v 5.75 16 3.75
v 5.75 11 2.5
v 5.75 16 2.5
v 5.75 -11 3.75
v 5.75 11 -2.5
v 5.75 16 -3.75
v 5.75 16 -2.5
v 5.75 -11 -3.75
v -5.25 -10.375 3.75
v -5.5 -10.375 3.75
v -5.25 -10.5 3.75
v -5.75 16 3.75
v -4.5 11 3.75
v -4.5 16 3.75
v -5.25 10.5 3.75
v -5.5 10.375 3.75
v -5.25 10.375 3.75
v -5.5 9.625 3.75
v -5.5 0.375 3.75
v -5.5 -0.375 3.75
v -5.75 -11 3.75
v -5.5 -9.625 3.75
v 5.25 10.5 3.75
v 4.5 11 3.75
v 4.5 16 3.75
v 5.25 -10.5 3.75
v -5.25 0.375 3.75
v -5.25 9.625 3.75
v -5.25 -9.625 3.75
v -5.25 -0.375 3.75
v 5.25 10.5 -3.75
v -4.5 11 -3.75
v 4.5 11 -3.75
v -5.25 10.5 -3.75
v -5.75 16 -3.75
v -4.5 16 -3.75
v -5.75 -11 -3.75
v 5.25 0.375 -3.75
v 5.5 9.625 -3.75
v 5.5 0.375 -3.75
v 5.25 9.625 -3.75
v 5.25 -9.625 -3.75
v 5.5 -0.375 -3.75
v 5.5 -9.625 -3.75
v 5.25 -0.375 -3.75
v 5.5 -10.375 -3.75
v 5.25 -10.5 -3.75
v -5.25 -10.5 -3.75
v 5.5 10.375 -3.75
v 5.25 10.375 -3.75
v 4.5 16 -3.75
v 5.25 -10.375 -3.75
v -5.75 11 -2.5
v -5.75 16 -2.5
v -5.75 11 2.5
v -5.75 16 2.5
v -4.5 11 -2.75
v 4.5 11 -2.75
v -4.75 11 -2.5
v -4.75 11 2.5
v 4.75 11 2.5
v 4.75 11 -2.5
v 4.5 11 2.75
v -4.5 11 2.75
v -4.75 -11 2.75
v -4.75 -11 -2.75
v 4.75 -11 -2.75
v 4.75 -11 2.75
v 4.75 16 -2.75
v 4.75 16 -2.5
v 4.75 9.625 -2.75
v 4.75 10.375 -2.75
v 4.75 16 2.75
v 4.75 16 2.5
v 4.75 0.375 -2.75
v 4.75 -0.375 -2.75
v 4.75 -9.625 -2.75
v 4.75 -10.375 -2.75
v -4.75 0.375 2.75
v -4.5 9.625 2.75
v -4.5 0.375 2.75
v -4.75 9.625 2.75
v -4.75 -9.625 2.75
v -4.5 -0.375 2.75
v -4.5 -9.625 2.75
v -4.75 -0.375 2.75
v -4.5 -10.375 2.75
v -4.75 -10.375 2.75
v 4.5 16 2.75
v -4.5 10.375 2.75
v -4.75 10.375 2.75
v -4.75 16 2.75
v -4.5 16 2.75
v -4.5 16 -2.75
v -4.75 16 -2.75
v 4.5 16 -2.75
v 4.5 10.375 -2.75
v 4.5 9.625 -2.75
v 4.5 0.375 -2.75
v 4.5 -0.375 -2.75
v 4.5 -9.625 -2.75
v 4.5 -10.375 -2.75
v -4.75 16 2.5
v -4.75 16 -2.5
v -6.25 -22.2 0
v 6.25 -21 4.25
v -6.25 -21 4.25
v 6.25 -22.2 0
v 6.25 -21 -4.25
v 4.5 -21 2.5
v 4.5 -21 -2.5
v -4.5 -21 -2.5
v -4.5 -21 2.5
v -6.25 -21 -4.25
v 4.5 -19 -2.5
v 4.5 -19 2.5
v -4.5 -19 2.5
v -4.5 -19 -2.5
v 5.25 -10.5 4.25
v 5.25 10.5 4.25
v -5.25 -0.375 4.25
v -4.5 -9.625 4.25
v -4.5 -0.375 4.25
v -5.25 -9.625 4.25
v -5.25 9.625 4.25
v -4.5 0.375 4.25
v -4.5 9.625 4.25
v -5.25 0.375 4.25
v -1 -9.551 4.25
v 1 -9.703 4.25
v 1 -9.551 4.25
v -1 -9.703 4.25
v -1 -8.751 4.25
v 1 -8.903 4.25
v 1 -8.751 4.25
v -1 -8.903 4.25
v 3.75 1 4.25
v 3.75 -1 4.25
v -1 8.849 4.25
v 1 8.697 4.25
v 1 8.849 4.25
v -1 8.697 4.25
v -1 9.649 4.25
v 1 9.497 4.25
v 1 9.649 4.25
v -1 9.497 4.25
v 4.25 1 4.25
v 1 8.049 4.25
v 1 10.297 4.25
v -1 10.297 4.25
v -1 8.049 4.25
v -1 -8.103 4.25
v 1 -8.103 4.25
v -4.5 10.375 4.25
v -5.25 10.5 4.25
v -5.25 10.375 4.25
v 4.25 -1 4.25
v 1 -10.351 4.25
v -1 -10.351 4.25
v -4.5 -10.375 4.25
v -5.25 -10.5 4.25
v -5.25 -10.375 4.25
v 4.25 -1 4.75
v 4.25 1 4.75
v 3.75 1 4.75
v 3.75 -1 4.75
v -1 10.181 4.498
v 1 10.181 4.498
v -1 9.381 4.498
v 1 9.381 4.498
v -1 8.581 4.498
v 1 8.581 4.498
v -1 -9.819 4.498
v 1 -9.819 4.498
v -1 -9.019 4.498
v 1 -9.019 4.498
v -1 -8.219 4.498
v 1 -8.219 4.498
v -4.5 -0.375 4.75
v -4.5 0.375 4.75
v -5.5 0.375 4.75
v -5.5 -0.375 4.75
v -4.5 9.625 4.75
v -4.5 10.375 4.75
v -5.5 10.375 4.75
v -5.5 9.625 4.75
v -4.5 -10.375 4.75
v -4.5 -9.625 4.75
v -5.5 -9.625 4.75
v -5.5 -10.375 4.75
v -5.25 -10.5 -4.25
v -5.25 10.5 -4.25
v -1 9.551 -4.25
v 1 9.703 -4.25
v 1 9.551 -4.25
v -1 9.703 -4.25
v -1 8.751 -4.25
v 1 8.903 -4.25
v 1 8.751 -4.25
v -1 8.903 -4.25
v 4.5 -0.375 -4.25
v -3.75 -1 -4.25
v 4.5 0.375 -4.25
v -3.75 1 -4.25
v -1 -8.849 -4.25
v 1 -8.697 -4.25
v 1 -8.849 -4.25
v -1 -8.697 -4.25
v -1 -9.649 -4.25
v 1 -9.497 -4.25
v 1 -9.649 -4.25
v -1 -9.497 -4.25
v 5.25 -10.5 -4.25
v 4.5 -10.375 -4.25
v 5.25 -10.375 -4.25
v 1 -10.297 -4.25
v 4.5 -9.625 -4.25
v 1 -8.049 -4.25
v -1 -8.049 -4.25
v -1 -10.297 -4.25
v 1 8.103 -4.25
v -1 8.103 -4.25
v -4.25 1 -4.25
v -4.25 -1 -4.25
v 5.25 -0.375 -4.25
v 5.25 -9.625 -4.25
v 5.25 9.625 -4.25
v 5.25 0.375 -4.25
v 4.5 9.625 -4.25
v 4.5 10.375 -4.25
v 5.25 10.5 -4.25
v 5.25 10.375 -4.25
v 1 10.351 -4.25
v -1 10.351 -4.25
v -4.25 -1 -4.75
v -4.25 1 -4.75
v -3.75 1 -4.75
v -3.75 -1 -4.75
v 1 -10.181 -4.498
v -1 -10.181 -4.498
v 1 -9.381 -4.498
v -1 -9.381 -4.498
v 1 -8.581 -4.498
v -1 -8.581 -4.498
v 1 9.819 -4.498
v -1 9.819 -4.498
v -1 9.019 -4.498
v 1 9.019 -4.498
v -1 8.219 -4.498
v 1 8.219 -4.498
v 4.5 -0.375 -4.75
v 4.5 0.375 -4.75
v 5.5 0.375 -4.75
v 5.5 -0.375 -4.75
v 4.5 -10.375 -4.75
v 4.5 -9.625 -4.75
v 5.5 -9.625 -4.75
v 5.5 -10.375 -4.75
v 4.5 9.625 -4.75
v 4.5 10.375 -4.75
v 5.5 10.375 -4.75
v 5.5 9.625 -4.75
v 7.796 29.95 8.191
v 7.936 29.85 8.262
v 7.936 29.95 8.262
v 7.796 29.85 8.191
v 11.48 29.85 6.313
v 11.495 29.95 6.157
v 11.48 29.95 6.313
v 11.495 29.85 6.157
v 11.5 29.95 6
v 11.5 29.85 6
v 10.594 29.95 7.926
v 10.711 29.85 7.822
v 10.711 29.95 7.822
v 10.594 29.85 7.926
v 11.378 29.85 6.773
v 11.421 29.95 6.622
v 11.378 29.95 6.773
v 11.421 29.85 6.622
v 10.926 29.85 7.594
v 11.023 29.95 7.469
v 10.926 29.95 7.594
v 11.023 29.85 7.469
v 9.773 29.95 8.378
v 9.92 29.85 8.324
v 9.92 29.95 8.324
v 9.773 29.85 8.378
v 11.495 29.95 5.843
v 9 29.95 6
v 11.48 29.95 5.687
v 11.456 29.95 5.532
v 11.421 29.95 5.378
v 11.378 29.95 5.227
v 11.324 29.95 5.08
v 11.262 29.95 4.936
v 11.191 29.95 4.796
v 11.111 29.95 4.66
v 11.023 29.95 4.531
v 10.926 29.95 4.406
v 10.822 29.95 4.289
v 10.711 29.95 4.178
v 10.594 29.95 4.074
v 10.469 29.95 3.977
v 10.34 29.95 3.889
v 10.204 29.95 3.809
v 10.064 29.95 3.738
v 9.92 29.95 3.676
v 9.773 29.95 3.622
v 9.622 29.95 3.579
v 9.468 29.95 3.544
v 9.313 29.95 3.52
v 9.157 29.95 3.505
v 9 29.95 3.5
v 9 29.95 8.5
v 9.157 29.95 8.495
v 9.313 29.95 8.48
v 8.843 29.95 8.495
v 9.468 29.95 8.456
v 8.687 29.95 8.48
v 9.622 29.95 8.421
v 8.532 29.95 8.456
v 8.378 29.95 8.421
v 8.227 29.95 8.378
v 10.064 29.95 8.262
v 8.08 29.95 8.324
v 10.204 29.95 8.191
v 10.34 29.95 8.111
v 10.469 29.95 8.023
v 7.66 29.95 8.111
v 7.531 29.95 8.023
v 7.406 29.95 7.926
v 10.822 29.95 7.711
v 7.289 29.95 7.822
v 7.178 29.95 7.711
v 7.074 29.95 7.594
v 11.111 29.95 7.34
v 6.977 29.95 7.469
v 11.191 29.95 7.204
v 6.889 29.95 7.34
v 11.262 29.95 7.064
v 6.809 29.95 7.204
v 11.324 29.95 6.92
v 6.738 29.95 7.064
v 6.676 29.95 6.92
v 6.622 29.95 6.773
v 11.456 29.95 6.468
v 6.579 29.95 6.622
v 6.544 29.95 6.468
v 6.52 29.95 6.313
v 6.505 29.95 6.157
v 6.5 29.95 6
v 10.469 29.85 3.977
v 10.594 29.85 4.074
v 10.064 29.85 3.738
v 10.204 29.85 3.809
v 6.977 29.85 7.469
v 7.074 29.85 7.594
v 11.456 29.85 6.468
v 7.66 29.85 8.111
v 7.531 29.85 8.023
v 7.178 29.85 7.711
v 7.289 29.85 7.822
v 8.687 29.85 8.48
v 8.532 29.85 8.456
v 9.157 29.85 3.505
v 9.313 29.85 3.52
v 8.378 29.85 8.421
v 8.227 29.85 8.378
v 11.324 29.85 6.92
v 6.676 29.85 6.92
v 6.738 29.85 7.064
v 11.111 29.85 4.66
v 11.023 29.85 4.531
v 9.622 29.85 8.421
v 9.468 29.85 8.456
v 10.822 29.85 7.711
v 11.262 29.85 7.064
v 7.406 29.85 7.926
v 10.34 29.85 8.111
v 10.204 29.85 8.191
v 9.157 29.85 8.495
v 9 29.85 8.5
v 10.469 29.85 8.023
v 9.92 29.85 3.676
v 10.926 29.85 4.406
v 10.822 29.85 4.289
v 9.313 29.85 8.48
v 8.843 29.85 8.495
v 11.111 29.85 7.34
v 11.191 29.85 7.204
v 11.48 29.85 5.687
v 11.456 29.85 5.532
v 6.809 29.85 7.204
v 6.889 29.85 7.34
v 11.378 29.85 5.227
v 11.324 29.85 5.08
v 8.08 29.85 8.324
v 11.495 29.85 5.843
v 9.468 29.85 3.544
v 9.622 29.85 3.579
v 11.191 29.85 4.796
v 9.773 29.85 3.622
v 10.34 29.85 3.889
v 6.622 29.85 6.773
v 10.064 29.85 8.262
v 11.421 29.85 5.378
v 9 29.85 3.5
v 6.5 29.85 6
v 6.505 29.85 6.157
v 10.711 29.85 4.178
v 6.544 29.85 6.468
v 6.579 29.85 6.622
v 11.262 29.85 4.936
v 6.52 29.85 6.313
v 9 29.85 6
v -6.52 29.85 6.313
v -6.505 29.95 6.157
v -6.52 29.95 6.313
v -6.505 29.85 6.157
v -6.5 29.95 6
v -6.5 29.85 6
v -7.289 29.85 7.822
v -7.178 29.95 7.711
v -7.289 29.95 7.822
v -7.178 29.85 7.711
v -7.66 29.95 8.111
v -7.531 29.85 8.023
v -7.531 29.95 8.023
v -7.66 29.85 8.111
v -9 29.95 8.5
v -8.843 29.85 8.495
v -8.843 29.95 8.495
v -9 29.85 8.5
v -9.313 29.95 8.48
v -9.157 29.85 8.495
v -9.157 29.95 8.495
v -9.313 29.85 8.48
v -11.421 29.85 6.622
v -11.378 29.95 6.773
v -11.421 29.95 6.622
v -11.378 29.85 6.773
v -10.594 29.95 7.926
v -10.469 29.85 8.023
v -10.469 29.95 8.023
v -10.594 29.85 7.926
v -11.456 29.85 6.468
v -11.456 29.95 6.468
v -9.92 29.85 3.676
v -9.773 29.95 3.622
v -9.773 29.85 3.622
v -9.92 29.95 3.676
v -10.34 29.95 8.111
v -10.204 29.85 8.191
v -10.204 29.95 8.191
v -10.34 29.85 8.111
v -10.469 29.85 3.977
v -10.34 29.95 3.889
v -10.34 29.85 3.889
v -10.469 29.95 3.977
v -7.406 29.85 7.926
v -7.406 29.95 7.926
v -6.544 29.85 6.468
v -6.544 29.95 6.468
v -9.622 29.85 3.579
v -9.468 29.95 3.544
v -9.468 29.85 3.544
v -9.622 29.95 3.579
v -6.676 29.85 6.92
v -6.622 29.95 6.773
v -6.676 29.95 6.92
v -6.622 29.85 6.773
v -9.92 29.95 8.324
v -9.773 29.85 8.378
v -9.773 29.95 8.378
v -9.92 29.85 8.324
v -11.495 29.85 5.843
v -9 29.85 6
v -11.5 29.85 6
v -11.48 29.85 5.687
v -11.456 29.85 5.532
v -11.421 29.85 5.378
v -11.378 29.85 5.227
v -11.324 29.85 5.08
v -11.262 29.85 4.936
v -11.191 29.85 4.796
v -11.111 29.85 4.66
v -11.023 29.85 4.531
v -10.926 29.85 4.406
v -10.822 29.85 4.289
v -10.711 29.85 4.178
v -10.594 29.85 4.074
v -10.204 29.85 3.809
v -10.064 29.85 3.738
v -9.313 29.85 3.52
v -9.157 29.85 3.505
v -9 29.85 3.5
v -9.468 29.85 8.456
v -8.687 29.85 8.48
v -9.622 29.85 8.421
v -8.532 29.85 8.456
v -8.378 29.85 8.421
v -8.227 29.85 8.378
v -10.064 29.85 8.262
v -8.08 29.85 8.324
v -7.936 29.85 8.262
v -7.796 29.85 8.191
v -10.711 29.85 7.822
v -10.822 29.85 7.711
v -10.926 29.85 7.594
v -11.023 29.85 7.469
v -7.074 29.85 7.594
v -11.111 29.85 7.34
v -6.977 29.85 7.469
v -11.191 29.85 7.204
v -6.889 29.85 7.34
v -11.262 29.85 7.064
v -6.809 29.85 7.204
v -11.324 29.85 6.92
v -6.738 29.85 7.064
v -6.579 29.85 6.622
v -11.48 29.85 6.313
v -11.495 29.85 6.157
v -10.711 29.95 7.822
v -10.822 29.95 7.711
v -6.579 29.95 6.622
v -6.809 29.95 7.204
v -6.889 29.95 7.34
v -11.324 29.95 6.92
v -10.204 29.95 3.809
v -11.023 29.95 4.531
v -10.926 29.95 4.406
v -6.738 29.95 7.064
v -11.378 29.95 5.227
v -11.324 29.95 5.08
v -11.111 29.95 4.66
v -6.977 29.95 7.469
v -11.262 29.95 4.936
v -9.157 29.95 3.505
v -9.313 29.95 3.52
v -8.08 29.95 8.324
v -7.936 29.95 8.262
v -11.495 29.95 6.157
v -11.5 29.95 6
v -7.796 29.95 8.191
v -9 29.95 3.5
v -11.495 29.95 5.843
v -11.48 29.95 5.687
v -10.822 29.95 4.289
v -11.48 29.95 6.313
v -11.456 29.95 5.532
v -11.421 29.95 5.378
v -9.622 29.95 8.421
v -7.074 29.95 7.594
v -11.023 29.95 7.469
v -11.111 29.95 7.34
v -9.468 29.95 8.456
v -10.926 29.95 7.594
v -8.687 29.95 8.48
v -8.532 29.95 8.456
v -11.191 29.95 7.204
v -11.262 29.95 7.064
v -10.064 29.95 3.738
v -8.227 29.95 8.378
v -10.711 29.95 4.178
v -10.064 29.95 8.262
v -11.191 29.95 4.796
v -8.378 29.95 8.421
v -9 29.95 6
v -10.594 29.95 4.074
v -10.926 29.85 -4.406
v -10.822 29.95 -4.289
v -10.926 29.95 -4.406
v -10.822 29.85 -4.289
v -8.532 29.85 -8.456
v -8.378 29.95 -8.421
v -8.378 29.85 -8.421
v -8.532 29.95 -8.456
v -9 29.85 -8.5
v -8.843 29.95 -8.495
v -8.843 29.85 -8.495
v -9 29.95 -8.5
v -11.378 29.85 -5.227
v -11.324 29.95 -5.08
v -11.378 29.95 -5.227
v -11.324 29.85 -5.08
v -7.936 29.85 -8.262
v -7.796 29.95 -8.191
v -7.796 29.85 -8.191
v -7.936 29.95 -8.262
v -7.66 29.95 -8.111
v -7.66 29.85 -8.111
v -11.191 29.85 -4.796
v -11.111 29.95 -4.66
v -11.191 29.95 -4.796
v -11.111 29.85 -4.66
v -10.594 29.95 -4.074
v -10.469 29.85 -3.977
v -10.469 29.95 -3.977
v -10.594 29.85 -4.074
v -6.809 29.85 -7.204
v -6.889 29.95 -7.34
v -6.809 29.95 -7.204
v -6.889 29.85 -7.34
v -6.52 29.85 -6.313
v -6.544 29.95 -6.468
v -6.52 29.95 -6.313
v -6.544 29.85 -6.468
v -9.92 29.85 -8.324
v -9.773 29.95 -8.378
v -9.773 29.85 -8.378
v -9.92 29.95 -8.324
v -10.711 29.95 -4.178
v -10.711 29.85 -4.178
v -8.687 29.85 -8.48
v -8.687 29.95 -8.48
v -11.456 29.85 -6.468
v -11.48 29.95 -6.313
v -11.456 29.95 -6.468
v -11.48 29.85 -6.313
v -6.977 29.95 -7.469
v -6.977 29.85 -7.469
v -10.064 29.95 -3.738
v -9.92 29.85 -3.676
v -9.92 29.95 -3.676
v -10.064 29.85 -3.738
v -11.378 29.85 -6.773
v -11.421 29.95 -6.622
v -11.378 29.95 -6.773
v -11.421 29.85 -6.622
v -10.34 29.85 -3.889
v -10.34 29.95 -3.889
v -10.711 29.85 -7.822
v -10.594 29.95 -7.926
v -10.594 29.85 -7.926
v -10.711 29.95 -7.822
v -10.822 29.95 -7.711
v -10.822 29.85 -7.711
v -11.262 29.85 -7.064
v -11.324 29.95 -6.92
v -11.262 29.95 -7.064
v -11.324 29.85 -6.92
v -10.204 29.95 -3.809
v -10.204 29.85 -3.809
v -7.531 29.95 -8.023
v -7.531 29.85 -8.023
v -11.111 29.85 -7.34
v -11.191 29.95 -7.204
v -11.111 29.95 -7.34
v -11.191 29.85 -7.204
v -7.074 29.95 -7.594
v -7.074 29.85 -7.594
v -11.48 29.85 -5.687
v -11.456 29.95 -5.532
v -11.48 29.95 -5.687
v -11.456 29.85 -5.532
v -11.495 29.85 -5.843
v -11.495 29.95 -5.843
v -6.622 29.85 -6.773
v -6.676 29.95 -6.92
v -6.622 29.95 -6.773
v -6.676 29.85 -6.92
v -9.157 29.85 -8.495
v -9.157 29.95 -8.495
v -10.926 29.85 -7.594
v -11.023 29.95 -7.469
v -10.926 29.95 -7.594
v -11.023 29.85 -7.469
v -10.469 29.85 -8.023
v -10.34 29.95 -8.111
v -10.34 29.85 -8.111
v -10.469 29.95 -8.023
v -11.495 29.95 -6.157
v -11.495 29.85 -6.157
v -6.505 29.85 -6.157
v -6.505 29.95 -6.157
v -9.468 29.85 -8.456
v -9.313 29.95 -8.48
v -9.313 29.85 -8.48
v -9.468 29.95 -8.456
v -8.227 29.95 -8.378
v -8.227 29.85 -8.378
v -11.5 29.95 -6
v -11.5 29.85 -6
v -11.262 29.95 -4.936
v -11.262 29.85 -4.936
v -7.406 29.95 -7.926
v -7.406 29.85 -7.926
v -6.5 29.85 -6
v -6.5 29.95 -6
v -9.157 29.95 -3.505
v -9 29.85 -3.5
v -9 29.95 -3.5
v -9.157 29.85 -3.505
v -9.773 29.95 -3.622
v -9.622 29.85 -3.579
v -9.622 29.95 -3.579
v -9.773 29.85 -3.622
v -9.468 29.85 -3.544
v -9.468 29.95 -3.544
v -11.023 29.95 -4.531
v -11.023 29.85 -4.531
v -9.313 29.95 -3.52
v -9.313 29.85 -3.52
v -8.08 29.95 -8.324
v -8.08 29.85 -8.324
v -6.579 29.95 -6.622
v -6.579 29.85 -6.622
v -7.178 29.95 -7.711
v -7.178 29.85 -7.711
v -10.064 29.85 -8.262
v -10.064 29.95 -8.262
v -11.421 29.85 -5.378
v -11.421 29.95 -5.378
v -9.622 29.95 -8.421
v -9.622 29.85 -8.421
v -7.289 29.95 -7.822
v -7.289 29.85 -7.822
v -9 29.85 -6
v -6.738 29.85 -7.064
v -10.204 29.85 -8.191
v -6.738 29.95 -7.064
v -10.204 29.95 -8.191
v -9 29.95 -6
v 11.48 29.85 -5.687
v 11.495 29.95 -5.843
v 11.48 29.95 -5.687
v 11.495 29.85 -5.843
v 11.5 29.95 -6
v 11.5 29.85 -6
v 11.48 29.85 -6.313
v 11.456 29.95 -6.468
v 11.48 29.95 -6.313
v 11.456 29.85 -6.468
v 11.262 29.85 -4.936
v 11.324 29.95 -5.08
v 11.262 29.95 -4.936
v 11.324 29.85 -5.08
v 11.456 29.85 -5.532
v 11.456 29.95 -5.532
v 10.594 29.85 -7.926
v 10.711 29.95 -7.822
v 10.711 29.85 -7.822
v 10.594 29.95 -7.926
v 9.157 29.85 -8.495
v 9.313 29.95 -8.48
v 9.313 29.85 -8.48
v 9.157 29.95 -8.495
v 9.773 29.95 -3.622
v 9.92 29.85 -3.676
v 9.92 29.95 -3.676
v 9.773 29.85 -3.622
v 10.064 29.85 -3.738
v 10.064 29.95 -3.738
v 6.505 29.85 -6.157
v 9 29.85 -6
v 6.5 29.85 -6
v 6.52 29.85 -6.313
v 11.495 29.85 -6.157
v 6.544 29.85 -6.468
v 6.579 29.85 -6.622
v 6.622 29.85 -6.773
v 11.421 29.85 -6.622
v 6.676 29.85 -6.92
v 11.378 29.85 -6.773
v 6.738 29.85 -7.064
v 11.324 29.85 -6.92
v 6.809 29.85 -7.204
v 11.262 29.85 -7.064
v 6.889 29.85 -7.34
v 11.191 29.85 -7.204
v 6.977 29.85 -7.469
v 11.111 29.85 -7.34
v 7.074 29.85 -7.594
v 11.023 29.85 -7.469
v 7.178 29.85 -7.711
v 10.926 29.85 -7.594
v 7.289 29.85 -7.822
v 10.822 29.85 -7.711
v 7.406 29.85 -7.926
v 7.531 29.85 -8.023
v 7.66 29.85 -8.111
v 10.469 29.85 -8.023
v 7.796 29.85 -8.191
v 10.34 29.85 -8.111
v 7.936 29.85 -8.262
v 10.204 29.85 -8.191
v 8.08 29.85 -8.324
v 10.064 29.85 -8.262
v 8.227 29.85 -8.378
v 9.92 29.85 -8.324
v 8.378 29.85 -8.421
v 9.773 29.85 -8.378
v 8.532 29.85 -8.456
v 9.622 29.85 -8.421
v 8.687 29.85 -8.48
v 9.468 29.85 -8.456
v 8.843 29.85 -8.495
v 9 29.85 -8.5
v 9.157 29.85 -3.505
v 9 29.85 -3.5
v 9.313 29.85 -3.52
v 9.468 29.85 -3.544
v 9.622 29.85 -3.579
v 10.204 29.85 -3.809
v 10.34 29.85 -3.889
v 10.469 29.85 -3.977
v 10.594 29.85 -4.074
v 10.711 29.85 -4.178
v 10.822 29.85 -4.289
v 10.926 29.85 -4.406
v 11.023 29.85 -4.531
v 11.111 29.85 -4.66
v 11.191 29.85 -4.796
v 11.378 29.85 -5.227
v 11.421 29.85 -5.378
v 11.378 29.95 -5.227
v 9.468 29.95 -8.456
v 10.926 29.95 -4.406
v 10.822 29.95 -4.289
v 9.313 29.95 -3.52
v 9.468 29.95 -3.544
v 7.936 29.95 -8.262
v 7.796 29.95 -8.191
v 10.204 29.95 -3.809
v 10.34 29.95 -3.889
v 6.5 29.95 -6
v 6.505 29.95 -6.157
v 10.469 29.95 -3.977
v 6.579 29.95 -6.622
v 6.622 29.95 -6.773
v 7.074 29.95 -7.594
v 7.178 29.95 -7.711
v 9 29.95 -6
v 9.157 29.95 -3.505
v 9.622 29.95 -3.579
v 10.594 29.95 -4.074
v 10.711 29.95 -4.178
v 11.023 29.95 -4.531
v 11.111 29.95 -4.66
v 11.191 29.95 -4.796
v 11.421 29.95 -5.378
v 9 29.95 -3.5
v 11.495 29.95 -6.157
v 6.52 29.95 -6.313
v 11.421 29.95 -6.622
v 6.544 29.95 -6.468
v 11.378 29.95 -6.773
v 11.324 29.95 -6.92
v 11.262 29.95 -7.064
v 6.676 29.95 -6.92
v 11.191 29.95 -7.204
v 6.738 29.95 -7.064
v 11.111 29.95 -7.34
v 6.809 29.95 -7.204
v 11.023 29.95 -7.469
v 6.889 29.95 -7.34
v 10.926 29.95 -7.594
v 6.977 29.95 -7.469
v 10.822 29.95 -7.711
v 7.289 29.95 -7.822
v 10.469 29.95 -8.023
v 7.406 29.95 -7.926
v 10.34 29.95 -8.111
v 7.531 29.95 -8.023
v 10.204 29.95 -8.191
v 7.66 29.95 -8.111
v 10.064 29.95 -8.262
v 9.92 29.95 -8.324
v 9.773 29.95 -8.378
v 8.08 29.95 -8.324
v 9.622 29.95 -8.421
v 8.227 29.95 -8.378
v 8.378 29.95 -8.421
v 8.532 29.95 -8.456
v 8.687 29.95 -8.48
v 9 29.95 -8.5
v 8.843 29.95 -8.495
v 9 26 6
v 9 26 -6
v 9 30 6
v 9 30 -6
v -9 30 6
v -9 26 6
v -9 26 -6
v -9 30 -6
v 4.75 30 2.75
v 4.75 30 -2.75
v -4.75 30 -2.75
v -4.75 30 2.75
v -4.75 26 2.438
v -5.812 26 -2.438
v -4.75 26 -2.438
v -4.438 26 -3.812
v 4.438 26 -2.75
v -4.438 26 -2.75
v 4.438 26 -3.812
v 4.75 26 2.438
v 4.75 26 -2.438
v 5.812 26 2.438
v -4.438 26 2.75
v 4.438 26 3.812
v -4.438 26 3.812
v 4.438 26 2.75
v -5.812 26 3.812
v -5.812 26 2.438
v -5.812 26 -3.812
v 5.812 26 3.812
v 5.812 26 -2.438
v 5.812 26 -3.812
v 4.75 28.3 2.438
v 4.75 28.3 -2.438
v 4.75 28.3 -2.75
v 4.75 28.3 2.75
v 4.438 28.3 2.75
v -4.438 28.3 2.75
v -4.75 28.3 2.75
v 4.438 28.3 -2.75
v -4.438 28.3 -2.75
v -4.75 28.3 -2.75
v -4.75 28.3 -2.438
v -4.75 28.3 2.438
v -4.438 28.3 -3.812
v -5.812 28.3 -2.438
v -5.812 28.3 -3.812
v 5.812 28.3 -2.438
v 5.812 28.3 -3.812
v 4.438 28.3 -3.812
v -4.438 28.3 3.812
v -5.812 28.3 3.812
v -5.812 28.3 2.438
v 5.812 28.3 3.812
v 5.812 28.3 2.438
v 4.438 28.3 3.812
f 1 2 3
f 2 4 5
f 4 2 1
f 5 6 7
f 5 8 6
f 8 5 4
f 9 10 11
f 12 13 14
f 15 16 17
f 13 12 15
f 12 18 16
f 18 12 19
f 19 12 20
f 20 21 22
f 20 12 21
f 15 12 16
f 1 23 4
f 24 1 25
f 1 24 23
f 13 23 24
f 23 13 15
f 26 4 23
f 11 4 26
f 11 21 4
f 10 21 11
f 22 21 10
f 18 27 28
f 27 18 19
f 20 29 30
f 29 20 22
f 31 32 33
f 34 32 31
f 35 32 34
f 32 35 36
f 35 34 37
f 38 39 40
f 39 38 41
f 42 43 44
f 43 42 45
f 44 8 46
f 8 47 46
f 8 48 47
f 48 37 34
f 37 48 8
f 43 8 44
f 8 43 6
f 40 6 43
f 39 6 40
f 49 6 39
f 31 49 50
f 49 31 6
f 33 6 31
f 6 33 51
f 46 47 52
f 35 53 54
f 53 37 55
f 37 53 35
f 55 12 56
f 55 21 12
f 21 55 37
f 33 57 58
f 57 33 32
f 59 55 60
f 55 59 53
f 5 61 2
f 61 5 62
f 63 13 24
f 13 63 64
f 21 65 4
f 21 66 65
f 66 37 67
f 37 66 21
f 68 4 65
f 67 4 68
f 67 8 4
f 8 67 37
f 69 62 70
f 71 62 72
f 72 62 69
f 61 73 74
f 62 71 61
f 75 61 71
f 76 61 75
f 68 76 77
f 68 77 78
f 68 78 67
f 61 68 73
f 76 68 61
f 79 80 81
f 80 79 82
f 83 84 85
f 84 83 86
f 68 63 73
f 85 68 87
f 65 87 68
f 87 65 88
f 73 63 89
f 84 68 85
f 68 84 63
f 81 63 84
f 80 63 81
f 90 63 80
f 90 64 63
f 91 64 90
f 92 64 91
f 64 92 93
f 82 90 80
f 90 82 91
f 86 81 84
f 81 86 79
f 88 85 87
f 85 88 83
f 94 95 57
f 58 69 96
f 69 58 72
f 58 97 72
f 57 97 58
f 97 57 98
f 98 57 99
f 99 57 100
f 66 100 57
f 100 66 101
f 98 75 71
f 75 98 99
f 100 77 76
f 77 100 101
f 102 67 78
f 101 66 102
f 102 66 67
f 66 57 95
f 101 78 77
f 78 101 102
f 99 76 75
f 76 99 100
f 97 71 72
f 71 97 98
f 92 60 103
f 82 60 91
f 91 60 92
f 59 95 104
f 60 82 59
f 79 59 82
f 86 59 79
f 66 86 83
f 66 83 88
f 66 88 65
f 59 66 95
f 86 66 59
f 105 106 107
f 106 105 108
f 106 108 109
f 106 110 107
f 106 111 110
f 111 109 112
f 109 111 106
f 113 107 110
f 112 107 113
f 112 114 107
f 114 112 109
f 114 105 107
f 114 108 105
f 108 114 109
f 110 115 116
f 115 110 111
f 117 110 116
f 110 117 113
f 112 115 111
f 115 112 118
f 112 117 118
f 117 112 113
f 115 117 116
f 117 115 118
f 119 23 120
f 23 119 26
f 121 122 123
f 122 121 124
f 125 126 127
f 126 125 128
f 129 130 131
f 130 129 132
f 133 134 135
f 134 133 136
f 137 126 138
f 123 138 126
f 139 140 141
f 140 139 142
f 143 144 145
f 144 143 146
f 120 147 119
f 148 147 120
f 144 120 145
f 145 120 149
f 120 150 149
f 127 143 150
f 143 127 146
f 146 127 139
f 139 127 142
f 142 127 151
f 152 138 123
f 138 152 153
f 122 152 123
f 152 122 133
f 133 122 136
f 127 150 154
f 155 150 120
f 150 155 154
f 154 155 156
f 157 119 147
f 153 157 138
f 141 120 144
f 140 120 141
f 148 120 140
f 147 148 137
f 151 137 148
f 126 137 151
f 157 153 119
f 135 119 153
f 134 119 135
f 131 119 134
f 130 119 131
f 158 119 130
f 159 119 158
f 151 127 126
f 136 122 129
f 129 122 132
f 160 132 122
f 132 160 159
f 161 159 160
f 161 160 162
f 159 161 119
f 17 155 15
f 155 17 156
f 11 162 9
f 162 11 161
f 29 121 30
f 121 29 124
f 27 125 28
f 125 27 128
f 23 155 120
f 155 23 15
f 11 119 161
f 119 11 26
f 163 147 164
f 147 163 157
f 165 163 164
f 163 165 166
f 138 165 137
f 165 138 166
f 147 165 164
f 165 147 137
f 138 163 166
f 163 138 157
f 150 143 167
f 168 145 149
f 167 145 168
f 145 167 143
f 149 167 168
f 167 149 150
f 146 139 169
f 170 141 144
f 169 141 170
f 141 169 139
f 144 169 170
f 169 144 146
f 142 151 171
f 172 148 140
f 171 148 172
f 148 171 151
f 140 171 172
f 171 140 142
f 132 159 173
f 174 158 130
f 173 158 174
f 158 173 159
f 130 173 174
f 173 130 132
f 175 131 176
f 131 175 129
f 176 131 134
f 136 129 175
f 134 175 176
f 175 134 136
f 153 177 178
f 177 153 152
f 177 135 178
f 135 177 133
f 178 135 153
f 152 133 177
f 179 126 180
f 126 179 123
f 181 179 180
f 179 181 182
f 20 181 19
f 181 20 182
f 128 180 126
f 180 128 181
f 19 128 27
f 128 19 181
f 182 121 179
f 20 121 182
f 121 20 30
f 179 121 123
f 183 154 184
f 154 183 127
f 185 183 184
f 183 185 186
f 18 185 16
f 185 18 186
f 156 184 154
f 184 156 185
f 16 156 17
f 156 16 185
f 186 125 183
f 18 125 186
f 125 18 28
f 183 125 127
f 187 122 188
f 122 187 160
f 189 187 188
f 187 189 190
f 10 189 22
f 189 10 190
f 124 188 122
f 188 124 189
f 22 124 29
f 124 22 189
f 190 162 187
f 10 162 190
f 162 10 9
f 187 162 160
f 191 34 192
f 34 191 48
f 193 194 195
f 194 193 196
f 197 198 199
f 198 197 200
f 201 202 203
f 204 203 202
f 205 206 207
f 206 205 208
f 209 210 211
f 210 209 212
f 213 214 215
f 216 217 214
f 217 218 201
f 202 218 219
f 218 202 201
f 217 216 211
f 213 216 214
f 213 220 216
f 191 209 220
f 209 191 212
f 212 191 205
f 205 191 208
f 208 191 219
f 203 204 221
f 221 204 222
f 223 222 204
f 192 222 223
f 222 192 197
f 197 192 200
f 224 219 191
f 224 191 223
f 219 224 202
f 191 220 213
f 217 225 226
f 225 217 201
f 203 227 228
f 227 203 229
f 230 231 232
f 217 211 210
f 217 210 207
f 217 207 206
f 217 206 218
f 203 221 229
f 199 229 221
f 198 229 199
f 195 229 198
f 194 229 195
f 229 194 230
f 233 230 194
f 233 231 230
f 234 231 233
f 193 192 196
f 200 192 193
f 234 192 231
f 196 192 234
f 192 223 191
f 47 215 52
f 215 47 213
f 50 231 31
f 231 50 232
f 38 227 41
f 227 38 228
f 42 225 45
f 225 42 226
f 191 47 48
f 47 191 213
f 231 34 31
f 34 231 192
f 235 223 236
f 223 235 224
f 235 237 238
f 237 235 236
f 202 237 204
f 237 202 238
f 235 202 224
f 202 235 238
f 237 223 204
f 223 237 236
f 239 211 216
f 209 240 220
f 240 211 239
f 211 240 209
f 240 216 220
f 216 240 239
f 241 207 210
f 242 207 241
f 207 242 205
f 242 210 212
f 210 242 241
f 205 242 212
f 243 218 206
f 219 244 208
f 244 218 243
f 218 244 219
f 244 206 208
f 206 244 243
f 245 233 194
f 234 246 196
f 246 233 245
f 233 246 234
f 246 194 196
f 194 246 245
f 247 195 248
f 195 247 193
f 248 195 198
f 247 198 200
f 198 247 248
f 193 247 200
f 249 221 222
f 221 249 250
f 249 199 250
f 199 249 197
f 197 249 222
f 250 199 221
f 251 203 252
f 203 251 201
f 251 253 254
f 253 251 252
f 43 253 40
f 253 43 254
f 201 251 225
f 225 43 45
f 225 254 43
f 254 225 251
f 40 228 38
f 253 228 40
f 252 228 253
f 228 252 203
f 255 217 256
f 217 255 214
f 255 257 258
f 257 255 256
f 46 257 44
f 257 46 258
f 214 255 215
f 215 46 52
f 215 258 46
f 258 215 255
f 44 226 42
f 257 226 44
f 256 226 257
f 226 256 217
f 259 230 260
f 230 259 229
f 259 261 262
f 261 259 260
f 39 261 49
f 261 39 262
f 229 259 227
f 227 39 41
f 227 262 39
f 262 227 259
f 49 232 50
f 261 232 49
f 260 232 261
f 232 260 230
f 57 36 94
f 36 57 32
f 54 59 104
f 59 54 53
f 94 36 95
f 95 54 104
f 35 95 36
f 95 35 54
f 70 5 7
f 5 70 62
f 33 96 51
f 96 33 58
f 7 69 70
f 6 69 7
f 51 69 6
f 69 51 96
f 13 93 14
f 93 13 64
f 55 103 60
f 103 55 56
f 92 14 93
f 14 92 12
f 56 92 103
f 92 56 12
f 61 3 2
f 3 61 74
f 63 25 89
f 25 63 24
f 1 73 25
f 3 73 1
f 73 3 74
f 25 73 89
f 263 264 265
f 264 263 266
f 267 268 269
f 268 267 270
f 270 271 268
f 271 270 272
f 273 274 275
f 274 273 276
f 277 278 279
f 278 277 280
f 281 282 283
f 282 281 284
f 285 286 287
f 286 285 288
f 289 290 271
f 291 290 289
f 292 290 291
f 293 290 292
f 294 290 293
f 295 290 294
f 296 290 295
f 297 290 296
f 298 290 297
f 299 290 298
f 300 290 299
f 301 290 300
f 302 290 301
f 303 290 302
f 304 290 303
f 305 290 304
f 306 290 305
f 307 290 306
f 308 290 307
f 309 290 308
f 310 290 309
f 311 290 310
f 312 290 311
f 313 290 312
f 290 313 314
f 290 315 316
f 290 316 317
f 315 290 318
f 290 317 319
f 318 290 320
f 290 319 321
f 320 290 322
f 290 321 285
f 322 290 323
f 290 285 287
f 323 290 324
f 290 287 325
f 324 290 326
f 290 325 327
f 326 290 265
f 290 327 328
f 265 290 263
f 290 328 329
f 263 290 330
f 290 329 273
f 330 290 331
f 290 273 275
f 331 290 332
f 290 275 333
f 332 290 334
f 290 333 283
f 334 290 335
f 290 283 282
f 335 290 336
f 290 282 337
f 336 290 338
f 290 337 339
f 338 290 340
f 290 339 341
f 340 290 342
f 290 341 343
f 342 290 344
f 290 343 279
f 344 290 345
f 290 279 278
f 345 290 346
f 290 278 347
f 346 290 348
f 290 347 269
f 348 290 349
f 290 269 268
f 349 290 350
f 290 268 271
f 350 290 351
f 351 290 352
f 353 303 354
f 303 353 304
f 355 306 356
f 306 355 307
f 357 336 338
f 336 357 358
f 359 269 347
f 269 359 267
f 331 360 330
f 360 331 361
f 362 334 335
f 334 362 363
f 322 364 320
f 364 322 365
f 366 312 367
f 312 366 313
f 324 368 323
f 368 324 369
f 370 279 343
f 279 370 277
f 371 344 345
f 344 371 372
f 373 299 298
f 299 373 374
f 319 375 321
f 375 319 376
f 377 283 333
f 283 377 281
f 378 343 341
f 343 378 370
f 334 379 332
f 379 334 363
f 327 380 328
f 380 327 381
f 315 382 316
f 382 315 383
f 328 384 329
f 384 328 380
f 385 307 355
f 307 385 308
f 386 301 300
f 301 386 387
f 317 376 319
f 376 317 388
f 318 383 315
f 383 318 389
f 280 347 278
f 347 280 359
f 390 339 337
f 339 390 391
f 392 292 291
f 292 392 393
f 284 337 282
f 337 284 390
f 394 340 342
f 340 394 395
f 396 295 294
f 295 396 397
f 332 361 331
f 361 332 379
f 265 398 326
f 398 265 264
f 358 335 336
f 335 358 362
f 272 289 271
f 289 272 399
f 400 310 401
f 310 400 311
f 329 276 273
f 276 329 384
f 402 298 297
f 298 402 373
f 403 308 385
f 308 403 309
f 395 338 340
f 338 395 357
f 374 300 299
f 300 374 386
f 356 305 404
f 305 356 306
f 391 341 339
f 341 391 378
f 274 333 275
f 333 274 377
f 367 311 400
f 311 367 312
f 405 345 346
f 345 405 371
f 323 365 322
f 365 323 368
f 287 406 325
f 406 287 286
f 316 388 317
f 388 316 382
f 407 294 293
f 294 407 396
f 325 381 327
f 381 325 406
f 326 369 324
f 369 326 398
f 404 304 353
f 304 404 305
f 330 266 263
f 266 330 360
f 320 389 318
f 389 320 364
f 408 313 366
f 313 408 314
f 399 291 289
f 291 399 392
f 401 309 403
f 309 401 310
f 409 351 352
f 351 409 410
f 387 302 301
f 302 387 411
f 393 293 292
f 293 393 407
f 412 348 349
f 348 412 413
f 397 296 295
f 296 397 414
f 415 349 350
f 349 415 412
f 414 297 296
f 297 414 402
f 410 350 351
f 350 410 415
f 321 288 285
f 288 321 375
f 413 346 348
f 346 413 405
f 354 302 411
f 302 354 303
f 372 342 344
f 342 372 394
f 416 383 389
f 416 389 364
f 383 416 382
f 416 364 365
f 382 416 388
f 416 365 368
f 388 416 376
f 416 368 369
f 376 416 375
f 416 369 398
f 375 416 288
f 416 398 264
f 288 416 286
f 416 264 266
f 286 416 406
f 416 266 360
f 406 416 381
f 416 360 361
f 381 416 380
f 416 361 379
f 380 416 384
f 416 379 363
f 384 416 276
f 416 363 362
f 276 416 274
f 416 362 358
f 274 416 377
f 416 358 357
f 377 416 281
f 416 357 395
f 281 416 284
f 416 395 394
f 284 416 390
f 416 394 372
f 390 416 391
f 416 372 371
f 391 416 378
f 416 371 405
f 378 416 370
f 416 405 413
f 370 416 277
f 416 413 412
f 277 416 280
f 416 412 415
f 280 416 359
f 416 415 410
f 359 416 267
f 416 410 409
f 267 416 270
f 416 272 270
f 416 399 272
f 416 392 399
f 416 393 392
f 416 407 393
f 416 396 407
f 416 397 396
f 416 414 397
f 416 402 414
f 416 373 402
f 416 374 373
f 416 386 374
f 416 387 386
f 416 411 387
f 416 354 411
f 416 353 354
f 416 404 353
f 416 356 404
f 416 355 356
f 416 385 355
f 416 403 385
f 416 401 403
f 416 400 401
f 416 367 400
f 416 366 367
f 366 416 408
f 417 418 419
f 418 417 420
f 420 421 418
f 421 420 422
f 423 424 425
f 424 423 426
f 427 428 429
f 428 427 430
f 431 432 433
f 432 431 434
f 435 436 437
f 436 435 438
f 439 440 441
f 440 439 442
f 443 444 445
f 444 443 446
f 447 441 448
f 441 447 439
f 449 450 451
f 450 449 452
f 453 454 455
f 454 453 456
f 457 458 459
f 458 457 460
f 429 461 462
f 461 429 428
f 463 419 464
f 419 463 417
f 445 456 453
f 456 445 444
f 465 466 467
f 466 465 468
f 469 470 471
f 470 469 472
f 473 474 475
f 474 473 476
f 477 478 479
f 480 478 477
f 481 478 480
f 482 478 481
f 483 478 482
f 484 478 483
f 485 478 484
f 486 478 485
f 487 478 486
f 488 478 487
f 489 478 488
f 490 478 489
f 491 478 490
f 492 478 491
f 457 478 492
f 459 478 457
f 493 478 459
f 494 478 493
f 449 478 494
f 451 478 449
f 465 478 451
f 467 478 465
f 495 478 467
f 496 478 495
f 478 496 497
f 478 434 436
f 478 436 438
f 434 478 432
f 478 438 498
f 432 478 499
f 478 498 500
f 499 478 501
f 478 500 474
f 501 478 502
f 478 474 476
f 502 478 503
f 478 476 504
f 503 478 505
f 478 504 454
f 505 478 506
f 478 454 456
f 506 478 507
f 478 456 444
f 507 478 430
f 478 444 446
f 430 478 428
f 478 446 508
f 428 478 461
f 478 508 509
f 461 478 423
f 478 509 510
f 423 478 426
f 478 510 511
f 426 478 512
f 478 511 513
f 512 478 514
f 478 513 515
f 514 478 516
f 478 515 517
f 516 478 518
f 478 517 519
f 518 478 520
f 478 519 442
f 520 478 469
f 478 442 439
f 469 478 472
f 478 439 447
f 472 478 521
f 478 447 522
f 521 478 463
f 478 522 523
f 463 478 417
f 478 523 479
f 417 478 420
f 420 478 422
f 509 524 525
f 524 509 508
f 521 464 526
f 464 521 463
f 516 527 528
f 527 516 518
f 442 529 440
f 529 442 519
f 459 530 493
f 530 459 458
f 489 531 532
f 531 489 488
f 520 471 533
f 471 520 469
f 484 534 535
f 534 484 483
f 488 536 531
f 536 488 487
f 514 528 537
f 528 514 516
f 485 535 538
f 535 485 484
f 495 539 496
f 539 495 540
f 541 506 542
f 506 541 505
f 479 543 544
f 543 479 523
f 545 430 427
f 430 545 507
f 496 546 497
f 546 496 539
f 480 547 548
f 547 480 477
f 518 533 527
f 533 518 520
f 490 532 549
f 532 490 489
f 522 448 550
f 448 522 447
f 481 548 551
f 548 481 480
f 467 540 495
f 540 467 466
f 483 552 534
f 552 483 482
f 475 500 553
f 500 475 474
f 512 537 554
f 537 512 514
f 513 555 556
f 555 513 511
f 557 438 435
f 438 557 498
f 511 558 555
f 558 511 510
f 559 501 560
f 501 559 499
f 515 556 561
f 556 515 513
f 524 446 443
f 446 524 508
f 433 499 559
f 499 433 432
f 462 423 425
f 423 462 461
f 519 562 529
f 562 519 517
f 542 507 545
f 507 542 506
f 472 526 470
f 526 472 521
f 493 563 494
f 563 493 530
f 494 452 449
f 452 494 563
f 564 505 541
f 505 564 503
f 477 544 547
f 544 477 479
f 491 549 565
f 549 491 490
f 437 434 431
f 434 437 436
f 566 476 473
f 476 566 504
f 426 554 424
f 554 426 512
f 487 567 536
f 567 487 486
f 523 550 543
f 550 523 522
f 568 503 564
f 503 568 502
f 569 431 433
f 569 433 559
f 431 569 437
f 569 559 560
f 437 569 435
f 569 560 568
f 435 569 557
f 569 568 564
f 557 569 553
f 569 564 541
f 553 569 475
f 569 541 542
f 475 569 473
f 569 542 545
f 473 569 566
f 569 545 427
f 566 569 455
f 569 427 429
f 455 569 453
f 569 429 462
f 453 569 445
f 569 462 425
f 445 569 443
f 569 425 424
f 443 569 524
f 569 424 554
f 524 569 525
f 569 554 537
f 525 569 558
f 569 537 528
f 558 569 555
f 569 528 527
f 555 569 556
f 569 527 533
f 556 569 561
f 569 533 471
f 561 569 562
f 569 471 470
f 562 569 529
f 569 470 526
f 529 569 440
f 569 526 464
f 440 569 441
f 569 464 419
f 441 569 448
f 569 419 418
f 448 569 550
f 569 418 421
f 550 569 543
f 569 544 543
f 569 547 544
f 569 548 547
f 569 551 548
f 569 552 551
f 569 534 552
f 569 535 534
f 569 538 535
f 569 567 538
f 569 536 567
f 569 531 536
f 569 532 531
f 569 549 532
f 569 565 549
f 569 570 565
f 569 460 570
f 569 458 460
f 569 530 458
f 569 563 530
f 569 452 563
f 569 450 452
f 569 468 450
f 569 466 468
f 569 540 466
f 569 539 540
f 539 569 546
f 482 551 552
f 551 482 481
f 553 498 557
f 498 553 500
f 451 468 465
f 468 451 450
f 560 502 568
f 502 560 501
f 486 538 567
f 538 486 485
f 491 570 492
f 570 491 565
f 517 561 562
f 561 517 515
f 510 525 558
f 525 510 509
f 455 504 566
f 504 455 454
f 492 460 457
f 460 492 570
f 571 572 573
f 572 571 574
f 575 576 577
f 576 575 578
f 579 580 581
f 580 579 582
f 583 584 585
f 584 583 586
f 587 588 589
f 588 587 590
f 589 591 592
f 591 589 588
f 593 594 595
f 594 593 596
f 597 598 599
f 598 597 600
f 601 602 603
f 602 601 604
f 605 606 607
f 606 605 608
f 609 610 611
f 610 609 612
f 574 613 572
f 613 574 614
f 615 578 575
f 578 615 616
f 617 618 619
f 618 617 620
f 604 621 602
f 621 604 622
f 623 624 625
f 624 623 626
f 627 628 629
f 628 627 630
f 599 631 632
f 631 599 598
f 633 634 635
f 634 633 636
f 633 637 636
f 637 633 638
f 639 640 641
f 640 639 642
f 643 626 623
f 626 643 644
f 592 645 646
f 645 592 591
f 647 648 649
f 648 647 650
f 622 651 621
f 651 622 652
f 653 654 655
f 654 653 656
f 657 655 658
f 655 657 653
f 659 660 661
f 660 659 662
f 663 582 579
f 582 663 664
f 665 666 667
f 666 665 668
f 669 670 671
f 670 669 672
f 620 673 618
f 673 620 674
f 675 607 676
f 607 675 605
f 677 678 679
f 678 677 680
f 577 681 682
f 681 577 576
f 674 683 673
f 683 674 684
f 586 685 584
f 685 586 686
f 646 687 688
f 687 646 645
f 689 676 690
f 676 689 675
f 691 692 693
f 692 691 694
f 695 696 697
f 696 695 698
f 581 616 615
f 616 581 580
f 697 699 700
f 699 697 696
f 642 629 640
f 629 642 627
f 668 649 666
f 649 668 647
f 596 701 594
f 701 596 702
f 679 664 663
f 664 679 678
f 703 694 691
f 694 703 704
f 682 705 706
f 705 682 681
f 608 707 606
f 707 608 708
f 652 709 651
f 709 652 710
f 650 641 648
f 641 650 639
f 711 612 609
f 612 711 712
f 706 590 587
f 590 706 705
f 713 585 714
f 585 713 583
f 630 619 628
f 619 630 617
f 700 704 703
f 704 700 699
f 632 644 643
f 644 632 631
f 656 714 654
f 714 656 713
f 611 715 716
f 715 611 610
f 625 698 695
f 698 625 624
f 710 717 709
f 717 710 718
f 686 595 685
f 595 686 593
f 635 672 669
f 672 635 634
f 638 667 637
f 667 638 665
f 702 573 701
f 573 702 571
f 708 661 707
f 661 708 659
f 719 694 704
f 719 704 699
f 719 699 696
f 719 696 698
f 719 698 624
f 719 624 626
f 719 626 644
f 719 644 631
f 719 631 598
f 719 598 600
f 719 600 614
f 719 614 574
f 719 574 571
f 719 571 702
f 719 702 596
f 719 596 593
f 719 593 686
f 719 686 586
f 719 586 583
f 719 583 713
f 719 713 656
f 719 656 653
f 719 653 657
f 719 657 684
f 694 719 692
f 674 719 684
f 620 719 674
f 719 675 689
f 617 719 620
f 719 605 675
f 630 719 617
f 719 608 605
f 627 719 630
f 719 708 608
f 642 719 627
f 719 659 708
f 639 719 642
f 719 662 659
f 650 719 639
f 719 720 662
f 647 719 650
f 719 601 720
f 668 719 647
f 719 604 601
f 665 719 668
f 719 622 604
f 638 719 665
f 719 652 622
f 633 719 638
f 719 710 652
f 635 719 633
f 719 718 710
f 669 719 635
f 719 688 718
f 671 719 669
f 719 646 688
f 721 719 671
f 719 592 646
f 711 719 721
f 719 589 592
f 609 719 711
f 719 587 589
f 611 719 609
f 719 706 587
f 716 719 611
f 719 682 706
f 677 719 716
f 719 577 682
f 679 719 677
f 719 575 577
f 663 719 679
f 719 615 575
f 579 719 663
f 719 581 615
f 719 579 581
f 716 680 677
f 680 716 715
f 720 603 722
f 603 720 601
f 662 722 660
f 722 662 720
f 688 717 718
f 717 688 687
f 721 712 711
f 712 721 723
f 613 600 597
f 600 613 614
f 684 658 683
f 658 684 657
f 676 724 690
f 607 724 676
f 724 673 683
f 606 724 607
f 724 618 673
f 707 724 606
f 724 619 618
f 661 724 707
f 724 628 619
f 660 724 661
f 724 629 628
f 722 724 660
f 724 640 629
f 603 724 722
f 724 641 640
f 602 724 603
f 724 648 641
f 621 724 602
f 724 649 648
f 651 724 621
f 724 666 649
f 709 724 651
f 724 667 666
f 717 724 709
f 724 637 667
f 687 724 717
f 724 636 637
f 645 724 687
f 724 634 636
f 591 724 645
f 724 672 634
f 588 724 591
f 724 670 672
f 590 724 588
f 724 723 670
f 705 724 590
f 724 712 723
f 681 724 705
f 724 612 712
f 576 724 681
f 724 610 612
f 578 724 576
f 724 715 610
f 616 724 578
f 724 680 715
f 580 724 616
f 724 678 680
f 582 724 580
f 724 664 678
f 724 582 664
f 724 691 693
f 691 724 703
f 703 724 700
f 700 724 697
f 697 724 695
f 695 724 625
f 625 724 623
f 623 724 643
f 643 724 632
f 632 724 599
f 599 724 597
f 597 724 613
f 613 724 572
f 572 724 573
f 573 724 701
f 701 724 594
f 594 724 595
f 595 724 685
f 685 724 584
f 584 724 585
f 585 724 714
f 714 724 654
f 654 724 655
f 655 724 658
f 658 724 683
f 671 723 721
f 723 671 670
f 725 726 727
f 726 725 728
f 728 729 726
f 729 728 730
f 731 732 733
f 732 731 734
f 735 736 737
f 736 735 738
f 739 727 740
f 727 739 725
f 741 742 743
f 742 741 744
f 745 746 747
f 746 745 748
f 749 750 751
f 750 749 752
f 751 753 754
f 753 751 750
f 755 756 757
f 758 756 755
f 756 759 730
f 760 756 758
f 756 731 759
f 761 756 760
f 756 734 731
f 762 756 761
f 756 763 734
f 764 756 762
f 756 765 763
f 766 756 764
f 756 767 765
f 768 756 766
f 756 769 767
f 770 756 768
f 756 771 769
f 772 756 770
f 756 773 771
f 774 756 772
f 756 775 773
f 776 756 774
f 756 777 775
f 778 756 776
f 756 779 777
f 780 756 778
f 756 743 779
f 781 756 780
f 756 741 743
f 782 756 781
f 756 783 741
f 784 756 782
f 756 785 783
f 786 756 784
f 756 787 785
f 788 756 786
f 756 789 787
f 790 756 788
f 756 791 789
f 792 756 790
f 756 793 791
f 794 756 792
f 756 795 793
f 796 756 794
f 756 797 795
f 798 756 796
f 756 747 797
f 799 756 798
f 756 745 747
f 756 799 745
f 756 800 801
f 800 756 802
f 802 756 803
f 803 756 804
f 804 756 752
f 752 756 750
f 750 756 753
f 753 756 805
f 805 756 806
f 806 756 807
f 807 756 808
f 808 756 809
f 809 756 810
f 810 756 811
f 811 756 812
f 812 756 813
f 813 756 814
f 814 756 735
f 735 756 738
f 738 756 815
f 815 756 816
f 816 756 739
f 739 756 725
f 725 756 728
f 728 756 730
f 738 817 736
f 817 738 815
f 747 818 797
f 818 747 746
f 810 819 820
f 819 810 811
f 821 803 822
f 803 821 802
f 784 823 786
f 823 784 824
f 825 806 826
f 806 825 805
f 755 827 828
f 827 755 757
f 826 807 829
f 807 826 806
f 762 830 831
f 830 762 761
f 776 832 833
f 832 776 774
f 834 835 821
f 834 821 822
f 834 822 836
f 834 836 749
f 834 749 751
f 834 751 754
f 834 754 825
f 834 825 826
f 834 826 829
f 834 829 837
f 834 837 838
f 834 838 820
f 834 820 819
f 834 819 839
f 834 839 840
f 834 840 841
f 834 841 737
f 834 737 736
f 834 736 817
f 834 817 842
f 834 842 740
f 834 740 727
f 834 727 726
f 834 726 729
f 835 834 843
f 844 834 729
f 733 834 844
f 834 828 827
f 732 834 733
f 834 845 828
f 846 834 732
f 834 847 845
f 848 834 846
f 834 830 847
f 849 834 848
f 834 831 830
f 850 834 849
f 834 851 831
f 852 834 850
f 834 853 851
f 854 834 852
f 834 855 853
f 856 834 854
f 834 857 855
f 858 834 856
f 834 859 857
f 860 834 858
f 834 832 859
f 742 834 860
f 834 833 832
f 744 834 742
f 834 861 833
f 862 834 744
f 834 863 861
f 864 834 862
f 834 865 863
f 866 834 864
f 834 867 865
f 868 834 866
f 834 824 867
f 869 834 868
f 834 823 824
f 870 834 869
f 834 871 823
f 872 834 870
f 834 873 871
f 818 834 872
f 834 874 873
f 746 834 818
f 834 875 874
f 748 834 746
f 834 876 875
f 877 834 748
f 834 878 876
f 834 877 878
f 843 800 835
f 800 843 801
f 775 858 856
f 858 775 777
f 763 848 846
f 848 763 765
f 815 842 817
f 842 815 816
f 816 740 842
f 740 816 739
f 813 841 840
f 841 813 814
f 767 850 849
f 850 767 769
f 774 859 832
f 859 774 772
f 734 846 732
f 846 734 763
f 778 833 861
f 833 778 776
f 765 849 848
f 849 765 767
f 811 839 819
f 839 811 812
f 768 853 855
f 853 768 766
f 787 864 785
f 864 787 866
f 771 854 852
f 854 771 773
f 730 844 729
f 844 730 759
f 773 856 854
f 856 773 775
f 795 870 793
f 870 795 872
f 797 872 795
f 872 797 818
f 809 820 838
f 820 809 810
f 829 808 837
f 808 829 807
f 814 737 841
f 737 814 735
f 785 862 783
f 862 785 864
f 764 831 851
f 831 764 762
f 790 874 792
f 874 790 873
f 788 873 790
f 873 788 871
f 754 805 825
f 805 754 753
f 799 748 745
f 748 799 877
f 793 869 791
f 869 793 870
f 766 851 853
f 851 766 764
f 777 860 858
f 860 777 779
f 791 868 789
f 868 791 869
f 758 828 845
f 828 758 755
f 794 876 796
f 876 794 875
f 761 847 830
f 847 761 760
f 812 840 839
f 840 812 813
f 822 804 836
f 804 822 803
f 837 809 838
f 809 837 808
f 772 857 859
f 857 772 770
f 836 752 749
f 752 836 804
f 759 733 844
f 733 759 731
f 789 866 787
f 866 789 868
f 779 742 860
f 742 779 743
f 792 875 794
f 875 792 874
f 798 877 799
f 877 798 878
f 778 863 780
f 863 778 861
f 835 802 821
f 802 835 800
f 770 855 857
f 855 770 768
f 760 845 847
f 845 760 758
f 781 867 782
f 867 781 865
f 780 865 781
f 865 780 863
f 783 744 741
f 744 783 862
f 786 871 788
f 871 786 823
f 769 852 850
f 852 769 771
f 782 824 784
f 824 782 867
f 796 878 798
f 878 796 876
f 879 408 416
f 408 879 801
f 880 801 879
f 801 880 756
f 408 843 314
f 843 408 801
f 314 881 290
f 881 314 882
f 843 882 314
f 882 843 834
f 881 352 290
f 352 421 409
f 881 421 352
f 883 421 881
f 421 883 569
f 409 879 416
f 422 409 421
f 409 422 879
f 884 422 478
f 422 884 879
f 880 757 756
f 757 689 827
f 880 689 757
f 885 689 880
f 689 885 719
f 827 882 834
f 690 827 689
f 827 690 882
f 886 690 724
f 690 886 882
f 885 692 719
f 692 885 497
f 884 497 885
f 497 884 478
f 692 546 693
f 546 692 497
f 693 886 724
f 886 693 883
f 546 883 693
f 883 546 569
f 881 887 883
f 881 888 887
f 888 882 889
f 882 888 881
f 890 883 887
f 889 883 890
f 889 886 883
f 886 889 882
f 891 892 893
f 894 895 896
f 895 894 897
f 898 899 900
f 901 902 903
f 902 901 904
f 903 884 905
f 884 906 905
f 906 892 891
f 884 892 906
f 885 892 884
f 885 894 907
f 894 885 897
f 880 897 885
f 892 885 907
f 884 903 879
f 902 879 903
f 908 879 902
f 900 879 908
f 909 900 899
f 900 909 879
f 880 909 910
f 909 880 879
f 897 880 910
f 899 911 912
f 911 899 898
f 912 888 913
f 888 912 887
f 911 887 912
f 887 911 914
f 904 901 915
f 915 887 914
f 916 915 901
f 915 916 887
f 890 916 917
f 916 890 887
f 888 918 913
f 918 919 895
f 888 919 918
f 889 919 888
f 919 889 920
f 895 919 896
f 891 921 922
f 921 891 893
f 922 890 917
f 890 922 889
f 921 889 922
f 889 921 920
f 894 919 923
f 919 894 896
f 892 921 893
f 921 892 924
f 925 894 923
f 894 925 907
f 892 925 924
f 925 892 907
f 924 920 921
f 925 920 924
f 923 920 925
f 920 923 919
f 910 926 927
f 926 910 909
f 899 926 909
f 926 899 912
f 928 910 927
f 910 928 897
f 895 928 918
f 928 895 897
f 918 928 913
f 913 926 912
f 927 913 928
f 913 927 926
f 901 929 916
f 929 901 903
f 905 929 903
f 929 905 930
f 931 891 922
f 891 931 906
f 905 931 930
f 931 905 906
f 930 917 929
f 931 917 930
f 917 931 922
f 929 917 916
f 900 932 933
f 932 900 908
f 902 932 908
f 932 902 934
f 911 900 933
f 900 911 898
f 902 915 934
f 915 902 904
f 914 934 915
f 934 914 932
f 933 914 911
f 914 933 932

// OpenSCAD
width=11.5;
height=22;
depth=7.5;

difference() {
  cube([width, height, depth], center=true);

  translate([0, 1, 0])
  cube([width-2, height+3, depth-2], center=true);
}

translate([0, -10, 0])
roof();

door();
mirror([1, 0, 0])
rotate([180, 0, 0])
door();

feet();

translate([0, 28, 0])
pad();

footSize=1.25;
footOffset=0.625;

module feet() {
  difference(){
    union() {
      translate([-width/2+footOffset, height/2+2, -depth/2+footOffset])
      foot();

      translate([width/2-footOffset, height/2+2, -depth/2+footOffset])
      foot();

      translate([-width/2+footOffset, height/2+2, depth/2-footOffset])
      foot();
      
      translate([width/2-footOffset, height/2+2, depth/2-footOffset])
      foot();
    }

    cube([width-2, height*2, depth-2], center=true);
  }
}

module foot() {
  cube([footSize, 6, footSize], center=true);
}

module door() {
  translate([0, 0, depth/2])
  cube([width-1, height-1, 1], center=true);

  // handle
  color("orange")
  translate([4, 0, depth/2+0.75])
  cube([0.5, 2, 0.5], center=true);

  // grates low
  color("orange")
  translate([0, 10, depth/2+0.25])
  rotate([25, 0, 0])
  cube([2, .75, .75], center=true);
  
  color("orange")
  translate([0, 9.2, depth/2+0.25])
  rotate([25, 0, 0])
  cube([2, .75, .75], center=true);

  color("orange")
  translate([0, 8.4, depth/2+0.25])
  rotate([25, 0, 0])
  cube([2, .75, .75], center=true);

  // grates high
  color("orange")
  translate([0, -10, depth/2+0.25])
  rotate([25, 0, 0])
  cube([2, .75, .75], center=true);
  
  color("orange")
  translate([0, -9.2, depth/2+0.25])
  rotate([25, 0, 0])
  cube([2, .75, .75], center=true);

  color("orange")
  translate([0, -8.4, depth/2+0.25])
  rotate([25, 0, 0])
  cube([2, .75, .75], center=true);


  // hinges
  color("orange")
  translate([-5, 0, depth/2])
  cube([1, .75, 2], center=true);

  color("orange")
  translate([-5, 10, depth/2])
  cube([1, .75, 2], center=true);

  color("orange")
  translate([-5, -10, depth/2])
  cube([1, .75, 2], center=true);
}

module roof() {
  union() {
    translate([-width/2-0.5, -12.2, 0])
      roofSide();
    rotate([0, 180, 0])
    translate([-width/2-0.5, -12.2, 0])
      roofSide();

      
    translate([0, -10, 0])
    cube([width-2.5, 2, depth-2.5], center=true);
  }
}

module pad(withEars=true) {
  pad_height=4;
  pad_length=12;
  pad_width=18;

  difference() {
    union() {
      cube([pad_width, pad_height , pad_length], center=true);

      if (withEars) {
        // mouse ears
        mouse_height=0.1;
        mouse_width=5;
        translate([pad_width/2, pad_height/2-mouse_height, pad_length/2])
        rotate([90, 0, 0])
        cylinder(h=mouse_height, d=mouse_width, center=true, $fn=100);

        translate([-pad_width/2, pad_height/2-mouse_height, pad_length/2])
        rotate([90, 0, 0])
        cylinder(h=mouse_height, d=mouse_width, center=true, $fn=100);

        translate([-pad_width/2, pad_height/2-mouse_height, -pad_length/2])
        rotate([90, 0, 0])
        cylinder(h=mouse_height, d=mouse_width, center=true, $fn=100);

        translate([pad_width/2, pad_height/2-mouse_height, -pad_length/2])
        rotate([90, 0, 0])
        cylinder(h=mouse_height, d=mouse_width, center=true, $fn=100);
      }
    }

    cube([width-2, 10, depth-2], center=true);

    translate([-width/2+footOffset, -3, -depth/2+footOffset])
    scale(1.1)
    foot();

    translate([width/2-footOffset, -3, -depth/2+footOffset])
    scale(1.1)
    foot();

    translate([-width/2+footOffset, -3, depth/2-footOffset])
    scale(1.1)
    foot();
    
    translate([width/2-footOffset, -3, depth/2-footOffset])
    scale(1.1)
    foot();

    cube([width-2, height*2, depth-2], center=true);
  }
}

module roofSide() {
  height=1.2;
  width=12.5;
  depth=4.25;

  polyhedron(
    points=[[0,0,0], [width,0,0], [width,height,0], [0,height,0], [0,height,depth], [width,height,depth]],
    faces=[[0,1,2,3],[5,4,3,2],[0,4,5,1],[0,3,4],[5,2,1]]
  );
}
